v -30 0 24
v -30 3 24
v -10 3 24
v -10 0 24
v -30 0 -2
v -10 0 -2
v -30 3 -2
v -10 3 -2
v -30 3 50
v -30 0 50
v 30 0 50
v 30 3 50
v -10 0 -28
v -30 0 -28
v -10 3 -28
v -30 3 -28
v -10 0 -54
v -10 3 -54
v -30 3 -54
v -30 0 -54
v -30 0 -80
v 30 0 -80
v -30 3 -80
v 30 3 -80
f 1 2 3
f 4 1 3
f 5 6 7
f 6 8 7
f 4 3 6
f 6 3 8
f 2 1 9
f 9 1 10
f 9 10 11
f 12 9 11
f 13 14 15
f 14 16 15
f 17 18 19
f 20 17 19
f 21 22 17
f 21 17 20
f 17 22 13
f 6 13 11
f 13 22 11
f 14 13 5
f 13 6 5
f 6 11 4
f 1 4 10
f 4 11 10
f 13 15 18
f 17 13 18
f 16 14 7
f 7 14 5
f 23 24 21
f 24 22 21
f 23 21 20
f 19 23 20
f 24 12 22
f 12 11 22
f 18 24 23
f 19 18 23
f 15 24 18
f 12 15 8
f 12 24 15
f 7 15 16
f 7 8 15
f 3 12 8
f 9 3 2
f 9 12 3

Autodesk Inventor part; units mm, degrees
ref_plane "YZ Plane" through (0, 0, 0) normal (1, 0, 0) x (0, 1, 0)
ref_plane "XZ Plane" through (0, 0, 0) normal (0, 1, 0) x (-1, 0, 0)
ref_plane "XY Plane" through (0, 0, 0) normal (0, 0, 1) x (1, 0, 0)
sketch "스케치1" plane through (0, 0, 0) normal (0, 1, 0) x (-1, 0, 0)
  line L0 (30, 50) -> (-30, 50)
  line L1 (-30, 50) -> (-30, -80)
  line L2 (-30, -80) -> (30, -80)
  line L3 (30, -80) -> (30, 50)
  point P0 (0, 0)
  dimension "d0" = 130
  dimension "d1" = 60
  dimension "d2" = 30
  dimension "d3" = 50
extrude "돌출1" add sketch "스케치1" along normal blind 3
sketch "스케치2" plane through (0, 3, 0) normal (0, 1, 0) x (1, 0, 0)
  line L0 (-30, 80) -> (-30, -50) projected
  line L1 (-10, 54) -> (-30, 54)
  line L2 (-30, 54) -> (-30, 28)
  line L3 (-30, 28) -> (-10, 28)
  line L4 (-10, 28) -> (-10, 54)
  line L5 (-10, 2) -> (-30, 2)
  line L6 (-30, 2) -> (-30, -24)
  line L7 (-30, -24) -> (-10, -24)
  line L8 (-10, -24) -> (-10, 2)
  line L9 (-30, -50) -> (30, -50) projected
  point P0 (0, 0)
  dimension "d6" = 26
  dimension "d7" = 26
  dimension "d8" = 26
  dimension "d9" = 26
  dimension "d10" = 20
extrude "돌출2" cut sketch "스케치2" against normal blind 10
equation "\"d7\" = d6"
equation "\"d8\" = d7"
equation "\"d9\" = d8"
properties part number "라즈베리파이_SMPS 격리판" material "PMMA 플라스틱"
